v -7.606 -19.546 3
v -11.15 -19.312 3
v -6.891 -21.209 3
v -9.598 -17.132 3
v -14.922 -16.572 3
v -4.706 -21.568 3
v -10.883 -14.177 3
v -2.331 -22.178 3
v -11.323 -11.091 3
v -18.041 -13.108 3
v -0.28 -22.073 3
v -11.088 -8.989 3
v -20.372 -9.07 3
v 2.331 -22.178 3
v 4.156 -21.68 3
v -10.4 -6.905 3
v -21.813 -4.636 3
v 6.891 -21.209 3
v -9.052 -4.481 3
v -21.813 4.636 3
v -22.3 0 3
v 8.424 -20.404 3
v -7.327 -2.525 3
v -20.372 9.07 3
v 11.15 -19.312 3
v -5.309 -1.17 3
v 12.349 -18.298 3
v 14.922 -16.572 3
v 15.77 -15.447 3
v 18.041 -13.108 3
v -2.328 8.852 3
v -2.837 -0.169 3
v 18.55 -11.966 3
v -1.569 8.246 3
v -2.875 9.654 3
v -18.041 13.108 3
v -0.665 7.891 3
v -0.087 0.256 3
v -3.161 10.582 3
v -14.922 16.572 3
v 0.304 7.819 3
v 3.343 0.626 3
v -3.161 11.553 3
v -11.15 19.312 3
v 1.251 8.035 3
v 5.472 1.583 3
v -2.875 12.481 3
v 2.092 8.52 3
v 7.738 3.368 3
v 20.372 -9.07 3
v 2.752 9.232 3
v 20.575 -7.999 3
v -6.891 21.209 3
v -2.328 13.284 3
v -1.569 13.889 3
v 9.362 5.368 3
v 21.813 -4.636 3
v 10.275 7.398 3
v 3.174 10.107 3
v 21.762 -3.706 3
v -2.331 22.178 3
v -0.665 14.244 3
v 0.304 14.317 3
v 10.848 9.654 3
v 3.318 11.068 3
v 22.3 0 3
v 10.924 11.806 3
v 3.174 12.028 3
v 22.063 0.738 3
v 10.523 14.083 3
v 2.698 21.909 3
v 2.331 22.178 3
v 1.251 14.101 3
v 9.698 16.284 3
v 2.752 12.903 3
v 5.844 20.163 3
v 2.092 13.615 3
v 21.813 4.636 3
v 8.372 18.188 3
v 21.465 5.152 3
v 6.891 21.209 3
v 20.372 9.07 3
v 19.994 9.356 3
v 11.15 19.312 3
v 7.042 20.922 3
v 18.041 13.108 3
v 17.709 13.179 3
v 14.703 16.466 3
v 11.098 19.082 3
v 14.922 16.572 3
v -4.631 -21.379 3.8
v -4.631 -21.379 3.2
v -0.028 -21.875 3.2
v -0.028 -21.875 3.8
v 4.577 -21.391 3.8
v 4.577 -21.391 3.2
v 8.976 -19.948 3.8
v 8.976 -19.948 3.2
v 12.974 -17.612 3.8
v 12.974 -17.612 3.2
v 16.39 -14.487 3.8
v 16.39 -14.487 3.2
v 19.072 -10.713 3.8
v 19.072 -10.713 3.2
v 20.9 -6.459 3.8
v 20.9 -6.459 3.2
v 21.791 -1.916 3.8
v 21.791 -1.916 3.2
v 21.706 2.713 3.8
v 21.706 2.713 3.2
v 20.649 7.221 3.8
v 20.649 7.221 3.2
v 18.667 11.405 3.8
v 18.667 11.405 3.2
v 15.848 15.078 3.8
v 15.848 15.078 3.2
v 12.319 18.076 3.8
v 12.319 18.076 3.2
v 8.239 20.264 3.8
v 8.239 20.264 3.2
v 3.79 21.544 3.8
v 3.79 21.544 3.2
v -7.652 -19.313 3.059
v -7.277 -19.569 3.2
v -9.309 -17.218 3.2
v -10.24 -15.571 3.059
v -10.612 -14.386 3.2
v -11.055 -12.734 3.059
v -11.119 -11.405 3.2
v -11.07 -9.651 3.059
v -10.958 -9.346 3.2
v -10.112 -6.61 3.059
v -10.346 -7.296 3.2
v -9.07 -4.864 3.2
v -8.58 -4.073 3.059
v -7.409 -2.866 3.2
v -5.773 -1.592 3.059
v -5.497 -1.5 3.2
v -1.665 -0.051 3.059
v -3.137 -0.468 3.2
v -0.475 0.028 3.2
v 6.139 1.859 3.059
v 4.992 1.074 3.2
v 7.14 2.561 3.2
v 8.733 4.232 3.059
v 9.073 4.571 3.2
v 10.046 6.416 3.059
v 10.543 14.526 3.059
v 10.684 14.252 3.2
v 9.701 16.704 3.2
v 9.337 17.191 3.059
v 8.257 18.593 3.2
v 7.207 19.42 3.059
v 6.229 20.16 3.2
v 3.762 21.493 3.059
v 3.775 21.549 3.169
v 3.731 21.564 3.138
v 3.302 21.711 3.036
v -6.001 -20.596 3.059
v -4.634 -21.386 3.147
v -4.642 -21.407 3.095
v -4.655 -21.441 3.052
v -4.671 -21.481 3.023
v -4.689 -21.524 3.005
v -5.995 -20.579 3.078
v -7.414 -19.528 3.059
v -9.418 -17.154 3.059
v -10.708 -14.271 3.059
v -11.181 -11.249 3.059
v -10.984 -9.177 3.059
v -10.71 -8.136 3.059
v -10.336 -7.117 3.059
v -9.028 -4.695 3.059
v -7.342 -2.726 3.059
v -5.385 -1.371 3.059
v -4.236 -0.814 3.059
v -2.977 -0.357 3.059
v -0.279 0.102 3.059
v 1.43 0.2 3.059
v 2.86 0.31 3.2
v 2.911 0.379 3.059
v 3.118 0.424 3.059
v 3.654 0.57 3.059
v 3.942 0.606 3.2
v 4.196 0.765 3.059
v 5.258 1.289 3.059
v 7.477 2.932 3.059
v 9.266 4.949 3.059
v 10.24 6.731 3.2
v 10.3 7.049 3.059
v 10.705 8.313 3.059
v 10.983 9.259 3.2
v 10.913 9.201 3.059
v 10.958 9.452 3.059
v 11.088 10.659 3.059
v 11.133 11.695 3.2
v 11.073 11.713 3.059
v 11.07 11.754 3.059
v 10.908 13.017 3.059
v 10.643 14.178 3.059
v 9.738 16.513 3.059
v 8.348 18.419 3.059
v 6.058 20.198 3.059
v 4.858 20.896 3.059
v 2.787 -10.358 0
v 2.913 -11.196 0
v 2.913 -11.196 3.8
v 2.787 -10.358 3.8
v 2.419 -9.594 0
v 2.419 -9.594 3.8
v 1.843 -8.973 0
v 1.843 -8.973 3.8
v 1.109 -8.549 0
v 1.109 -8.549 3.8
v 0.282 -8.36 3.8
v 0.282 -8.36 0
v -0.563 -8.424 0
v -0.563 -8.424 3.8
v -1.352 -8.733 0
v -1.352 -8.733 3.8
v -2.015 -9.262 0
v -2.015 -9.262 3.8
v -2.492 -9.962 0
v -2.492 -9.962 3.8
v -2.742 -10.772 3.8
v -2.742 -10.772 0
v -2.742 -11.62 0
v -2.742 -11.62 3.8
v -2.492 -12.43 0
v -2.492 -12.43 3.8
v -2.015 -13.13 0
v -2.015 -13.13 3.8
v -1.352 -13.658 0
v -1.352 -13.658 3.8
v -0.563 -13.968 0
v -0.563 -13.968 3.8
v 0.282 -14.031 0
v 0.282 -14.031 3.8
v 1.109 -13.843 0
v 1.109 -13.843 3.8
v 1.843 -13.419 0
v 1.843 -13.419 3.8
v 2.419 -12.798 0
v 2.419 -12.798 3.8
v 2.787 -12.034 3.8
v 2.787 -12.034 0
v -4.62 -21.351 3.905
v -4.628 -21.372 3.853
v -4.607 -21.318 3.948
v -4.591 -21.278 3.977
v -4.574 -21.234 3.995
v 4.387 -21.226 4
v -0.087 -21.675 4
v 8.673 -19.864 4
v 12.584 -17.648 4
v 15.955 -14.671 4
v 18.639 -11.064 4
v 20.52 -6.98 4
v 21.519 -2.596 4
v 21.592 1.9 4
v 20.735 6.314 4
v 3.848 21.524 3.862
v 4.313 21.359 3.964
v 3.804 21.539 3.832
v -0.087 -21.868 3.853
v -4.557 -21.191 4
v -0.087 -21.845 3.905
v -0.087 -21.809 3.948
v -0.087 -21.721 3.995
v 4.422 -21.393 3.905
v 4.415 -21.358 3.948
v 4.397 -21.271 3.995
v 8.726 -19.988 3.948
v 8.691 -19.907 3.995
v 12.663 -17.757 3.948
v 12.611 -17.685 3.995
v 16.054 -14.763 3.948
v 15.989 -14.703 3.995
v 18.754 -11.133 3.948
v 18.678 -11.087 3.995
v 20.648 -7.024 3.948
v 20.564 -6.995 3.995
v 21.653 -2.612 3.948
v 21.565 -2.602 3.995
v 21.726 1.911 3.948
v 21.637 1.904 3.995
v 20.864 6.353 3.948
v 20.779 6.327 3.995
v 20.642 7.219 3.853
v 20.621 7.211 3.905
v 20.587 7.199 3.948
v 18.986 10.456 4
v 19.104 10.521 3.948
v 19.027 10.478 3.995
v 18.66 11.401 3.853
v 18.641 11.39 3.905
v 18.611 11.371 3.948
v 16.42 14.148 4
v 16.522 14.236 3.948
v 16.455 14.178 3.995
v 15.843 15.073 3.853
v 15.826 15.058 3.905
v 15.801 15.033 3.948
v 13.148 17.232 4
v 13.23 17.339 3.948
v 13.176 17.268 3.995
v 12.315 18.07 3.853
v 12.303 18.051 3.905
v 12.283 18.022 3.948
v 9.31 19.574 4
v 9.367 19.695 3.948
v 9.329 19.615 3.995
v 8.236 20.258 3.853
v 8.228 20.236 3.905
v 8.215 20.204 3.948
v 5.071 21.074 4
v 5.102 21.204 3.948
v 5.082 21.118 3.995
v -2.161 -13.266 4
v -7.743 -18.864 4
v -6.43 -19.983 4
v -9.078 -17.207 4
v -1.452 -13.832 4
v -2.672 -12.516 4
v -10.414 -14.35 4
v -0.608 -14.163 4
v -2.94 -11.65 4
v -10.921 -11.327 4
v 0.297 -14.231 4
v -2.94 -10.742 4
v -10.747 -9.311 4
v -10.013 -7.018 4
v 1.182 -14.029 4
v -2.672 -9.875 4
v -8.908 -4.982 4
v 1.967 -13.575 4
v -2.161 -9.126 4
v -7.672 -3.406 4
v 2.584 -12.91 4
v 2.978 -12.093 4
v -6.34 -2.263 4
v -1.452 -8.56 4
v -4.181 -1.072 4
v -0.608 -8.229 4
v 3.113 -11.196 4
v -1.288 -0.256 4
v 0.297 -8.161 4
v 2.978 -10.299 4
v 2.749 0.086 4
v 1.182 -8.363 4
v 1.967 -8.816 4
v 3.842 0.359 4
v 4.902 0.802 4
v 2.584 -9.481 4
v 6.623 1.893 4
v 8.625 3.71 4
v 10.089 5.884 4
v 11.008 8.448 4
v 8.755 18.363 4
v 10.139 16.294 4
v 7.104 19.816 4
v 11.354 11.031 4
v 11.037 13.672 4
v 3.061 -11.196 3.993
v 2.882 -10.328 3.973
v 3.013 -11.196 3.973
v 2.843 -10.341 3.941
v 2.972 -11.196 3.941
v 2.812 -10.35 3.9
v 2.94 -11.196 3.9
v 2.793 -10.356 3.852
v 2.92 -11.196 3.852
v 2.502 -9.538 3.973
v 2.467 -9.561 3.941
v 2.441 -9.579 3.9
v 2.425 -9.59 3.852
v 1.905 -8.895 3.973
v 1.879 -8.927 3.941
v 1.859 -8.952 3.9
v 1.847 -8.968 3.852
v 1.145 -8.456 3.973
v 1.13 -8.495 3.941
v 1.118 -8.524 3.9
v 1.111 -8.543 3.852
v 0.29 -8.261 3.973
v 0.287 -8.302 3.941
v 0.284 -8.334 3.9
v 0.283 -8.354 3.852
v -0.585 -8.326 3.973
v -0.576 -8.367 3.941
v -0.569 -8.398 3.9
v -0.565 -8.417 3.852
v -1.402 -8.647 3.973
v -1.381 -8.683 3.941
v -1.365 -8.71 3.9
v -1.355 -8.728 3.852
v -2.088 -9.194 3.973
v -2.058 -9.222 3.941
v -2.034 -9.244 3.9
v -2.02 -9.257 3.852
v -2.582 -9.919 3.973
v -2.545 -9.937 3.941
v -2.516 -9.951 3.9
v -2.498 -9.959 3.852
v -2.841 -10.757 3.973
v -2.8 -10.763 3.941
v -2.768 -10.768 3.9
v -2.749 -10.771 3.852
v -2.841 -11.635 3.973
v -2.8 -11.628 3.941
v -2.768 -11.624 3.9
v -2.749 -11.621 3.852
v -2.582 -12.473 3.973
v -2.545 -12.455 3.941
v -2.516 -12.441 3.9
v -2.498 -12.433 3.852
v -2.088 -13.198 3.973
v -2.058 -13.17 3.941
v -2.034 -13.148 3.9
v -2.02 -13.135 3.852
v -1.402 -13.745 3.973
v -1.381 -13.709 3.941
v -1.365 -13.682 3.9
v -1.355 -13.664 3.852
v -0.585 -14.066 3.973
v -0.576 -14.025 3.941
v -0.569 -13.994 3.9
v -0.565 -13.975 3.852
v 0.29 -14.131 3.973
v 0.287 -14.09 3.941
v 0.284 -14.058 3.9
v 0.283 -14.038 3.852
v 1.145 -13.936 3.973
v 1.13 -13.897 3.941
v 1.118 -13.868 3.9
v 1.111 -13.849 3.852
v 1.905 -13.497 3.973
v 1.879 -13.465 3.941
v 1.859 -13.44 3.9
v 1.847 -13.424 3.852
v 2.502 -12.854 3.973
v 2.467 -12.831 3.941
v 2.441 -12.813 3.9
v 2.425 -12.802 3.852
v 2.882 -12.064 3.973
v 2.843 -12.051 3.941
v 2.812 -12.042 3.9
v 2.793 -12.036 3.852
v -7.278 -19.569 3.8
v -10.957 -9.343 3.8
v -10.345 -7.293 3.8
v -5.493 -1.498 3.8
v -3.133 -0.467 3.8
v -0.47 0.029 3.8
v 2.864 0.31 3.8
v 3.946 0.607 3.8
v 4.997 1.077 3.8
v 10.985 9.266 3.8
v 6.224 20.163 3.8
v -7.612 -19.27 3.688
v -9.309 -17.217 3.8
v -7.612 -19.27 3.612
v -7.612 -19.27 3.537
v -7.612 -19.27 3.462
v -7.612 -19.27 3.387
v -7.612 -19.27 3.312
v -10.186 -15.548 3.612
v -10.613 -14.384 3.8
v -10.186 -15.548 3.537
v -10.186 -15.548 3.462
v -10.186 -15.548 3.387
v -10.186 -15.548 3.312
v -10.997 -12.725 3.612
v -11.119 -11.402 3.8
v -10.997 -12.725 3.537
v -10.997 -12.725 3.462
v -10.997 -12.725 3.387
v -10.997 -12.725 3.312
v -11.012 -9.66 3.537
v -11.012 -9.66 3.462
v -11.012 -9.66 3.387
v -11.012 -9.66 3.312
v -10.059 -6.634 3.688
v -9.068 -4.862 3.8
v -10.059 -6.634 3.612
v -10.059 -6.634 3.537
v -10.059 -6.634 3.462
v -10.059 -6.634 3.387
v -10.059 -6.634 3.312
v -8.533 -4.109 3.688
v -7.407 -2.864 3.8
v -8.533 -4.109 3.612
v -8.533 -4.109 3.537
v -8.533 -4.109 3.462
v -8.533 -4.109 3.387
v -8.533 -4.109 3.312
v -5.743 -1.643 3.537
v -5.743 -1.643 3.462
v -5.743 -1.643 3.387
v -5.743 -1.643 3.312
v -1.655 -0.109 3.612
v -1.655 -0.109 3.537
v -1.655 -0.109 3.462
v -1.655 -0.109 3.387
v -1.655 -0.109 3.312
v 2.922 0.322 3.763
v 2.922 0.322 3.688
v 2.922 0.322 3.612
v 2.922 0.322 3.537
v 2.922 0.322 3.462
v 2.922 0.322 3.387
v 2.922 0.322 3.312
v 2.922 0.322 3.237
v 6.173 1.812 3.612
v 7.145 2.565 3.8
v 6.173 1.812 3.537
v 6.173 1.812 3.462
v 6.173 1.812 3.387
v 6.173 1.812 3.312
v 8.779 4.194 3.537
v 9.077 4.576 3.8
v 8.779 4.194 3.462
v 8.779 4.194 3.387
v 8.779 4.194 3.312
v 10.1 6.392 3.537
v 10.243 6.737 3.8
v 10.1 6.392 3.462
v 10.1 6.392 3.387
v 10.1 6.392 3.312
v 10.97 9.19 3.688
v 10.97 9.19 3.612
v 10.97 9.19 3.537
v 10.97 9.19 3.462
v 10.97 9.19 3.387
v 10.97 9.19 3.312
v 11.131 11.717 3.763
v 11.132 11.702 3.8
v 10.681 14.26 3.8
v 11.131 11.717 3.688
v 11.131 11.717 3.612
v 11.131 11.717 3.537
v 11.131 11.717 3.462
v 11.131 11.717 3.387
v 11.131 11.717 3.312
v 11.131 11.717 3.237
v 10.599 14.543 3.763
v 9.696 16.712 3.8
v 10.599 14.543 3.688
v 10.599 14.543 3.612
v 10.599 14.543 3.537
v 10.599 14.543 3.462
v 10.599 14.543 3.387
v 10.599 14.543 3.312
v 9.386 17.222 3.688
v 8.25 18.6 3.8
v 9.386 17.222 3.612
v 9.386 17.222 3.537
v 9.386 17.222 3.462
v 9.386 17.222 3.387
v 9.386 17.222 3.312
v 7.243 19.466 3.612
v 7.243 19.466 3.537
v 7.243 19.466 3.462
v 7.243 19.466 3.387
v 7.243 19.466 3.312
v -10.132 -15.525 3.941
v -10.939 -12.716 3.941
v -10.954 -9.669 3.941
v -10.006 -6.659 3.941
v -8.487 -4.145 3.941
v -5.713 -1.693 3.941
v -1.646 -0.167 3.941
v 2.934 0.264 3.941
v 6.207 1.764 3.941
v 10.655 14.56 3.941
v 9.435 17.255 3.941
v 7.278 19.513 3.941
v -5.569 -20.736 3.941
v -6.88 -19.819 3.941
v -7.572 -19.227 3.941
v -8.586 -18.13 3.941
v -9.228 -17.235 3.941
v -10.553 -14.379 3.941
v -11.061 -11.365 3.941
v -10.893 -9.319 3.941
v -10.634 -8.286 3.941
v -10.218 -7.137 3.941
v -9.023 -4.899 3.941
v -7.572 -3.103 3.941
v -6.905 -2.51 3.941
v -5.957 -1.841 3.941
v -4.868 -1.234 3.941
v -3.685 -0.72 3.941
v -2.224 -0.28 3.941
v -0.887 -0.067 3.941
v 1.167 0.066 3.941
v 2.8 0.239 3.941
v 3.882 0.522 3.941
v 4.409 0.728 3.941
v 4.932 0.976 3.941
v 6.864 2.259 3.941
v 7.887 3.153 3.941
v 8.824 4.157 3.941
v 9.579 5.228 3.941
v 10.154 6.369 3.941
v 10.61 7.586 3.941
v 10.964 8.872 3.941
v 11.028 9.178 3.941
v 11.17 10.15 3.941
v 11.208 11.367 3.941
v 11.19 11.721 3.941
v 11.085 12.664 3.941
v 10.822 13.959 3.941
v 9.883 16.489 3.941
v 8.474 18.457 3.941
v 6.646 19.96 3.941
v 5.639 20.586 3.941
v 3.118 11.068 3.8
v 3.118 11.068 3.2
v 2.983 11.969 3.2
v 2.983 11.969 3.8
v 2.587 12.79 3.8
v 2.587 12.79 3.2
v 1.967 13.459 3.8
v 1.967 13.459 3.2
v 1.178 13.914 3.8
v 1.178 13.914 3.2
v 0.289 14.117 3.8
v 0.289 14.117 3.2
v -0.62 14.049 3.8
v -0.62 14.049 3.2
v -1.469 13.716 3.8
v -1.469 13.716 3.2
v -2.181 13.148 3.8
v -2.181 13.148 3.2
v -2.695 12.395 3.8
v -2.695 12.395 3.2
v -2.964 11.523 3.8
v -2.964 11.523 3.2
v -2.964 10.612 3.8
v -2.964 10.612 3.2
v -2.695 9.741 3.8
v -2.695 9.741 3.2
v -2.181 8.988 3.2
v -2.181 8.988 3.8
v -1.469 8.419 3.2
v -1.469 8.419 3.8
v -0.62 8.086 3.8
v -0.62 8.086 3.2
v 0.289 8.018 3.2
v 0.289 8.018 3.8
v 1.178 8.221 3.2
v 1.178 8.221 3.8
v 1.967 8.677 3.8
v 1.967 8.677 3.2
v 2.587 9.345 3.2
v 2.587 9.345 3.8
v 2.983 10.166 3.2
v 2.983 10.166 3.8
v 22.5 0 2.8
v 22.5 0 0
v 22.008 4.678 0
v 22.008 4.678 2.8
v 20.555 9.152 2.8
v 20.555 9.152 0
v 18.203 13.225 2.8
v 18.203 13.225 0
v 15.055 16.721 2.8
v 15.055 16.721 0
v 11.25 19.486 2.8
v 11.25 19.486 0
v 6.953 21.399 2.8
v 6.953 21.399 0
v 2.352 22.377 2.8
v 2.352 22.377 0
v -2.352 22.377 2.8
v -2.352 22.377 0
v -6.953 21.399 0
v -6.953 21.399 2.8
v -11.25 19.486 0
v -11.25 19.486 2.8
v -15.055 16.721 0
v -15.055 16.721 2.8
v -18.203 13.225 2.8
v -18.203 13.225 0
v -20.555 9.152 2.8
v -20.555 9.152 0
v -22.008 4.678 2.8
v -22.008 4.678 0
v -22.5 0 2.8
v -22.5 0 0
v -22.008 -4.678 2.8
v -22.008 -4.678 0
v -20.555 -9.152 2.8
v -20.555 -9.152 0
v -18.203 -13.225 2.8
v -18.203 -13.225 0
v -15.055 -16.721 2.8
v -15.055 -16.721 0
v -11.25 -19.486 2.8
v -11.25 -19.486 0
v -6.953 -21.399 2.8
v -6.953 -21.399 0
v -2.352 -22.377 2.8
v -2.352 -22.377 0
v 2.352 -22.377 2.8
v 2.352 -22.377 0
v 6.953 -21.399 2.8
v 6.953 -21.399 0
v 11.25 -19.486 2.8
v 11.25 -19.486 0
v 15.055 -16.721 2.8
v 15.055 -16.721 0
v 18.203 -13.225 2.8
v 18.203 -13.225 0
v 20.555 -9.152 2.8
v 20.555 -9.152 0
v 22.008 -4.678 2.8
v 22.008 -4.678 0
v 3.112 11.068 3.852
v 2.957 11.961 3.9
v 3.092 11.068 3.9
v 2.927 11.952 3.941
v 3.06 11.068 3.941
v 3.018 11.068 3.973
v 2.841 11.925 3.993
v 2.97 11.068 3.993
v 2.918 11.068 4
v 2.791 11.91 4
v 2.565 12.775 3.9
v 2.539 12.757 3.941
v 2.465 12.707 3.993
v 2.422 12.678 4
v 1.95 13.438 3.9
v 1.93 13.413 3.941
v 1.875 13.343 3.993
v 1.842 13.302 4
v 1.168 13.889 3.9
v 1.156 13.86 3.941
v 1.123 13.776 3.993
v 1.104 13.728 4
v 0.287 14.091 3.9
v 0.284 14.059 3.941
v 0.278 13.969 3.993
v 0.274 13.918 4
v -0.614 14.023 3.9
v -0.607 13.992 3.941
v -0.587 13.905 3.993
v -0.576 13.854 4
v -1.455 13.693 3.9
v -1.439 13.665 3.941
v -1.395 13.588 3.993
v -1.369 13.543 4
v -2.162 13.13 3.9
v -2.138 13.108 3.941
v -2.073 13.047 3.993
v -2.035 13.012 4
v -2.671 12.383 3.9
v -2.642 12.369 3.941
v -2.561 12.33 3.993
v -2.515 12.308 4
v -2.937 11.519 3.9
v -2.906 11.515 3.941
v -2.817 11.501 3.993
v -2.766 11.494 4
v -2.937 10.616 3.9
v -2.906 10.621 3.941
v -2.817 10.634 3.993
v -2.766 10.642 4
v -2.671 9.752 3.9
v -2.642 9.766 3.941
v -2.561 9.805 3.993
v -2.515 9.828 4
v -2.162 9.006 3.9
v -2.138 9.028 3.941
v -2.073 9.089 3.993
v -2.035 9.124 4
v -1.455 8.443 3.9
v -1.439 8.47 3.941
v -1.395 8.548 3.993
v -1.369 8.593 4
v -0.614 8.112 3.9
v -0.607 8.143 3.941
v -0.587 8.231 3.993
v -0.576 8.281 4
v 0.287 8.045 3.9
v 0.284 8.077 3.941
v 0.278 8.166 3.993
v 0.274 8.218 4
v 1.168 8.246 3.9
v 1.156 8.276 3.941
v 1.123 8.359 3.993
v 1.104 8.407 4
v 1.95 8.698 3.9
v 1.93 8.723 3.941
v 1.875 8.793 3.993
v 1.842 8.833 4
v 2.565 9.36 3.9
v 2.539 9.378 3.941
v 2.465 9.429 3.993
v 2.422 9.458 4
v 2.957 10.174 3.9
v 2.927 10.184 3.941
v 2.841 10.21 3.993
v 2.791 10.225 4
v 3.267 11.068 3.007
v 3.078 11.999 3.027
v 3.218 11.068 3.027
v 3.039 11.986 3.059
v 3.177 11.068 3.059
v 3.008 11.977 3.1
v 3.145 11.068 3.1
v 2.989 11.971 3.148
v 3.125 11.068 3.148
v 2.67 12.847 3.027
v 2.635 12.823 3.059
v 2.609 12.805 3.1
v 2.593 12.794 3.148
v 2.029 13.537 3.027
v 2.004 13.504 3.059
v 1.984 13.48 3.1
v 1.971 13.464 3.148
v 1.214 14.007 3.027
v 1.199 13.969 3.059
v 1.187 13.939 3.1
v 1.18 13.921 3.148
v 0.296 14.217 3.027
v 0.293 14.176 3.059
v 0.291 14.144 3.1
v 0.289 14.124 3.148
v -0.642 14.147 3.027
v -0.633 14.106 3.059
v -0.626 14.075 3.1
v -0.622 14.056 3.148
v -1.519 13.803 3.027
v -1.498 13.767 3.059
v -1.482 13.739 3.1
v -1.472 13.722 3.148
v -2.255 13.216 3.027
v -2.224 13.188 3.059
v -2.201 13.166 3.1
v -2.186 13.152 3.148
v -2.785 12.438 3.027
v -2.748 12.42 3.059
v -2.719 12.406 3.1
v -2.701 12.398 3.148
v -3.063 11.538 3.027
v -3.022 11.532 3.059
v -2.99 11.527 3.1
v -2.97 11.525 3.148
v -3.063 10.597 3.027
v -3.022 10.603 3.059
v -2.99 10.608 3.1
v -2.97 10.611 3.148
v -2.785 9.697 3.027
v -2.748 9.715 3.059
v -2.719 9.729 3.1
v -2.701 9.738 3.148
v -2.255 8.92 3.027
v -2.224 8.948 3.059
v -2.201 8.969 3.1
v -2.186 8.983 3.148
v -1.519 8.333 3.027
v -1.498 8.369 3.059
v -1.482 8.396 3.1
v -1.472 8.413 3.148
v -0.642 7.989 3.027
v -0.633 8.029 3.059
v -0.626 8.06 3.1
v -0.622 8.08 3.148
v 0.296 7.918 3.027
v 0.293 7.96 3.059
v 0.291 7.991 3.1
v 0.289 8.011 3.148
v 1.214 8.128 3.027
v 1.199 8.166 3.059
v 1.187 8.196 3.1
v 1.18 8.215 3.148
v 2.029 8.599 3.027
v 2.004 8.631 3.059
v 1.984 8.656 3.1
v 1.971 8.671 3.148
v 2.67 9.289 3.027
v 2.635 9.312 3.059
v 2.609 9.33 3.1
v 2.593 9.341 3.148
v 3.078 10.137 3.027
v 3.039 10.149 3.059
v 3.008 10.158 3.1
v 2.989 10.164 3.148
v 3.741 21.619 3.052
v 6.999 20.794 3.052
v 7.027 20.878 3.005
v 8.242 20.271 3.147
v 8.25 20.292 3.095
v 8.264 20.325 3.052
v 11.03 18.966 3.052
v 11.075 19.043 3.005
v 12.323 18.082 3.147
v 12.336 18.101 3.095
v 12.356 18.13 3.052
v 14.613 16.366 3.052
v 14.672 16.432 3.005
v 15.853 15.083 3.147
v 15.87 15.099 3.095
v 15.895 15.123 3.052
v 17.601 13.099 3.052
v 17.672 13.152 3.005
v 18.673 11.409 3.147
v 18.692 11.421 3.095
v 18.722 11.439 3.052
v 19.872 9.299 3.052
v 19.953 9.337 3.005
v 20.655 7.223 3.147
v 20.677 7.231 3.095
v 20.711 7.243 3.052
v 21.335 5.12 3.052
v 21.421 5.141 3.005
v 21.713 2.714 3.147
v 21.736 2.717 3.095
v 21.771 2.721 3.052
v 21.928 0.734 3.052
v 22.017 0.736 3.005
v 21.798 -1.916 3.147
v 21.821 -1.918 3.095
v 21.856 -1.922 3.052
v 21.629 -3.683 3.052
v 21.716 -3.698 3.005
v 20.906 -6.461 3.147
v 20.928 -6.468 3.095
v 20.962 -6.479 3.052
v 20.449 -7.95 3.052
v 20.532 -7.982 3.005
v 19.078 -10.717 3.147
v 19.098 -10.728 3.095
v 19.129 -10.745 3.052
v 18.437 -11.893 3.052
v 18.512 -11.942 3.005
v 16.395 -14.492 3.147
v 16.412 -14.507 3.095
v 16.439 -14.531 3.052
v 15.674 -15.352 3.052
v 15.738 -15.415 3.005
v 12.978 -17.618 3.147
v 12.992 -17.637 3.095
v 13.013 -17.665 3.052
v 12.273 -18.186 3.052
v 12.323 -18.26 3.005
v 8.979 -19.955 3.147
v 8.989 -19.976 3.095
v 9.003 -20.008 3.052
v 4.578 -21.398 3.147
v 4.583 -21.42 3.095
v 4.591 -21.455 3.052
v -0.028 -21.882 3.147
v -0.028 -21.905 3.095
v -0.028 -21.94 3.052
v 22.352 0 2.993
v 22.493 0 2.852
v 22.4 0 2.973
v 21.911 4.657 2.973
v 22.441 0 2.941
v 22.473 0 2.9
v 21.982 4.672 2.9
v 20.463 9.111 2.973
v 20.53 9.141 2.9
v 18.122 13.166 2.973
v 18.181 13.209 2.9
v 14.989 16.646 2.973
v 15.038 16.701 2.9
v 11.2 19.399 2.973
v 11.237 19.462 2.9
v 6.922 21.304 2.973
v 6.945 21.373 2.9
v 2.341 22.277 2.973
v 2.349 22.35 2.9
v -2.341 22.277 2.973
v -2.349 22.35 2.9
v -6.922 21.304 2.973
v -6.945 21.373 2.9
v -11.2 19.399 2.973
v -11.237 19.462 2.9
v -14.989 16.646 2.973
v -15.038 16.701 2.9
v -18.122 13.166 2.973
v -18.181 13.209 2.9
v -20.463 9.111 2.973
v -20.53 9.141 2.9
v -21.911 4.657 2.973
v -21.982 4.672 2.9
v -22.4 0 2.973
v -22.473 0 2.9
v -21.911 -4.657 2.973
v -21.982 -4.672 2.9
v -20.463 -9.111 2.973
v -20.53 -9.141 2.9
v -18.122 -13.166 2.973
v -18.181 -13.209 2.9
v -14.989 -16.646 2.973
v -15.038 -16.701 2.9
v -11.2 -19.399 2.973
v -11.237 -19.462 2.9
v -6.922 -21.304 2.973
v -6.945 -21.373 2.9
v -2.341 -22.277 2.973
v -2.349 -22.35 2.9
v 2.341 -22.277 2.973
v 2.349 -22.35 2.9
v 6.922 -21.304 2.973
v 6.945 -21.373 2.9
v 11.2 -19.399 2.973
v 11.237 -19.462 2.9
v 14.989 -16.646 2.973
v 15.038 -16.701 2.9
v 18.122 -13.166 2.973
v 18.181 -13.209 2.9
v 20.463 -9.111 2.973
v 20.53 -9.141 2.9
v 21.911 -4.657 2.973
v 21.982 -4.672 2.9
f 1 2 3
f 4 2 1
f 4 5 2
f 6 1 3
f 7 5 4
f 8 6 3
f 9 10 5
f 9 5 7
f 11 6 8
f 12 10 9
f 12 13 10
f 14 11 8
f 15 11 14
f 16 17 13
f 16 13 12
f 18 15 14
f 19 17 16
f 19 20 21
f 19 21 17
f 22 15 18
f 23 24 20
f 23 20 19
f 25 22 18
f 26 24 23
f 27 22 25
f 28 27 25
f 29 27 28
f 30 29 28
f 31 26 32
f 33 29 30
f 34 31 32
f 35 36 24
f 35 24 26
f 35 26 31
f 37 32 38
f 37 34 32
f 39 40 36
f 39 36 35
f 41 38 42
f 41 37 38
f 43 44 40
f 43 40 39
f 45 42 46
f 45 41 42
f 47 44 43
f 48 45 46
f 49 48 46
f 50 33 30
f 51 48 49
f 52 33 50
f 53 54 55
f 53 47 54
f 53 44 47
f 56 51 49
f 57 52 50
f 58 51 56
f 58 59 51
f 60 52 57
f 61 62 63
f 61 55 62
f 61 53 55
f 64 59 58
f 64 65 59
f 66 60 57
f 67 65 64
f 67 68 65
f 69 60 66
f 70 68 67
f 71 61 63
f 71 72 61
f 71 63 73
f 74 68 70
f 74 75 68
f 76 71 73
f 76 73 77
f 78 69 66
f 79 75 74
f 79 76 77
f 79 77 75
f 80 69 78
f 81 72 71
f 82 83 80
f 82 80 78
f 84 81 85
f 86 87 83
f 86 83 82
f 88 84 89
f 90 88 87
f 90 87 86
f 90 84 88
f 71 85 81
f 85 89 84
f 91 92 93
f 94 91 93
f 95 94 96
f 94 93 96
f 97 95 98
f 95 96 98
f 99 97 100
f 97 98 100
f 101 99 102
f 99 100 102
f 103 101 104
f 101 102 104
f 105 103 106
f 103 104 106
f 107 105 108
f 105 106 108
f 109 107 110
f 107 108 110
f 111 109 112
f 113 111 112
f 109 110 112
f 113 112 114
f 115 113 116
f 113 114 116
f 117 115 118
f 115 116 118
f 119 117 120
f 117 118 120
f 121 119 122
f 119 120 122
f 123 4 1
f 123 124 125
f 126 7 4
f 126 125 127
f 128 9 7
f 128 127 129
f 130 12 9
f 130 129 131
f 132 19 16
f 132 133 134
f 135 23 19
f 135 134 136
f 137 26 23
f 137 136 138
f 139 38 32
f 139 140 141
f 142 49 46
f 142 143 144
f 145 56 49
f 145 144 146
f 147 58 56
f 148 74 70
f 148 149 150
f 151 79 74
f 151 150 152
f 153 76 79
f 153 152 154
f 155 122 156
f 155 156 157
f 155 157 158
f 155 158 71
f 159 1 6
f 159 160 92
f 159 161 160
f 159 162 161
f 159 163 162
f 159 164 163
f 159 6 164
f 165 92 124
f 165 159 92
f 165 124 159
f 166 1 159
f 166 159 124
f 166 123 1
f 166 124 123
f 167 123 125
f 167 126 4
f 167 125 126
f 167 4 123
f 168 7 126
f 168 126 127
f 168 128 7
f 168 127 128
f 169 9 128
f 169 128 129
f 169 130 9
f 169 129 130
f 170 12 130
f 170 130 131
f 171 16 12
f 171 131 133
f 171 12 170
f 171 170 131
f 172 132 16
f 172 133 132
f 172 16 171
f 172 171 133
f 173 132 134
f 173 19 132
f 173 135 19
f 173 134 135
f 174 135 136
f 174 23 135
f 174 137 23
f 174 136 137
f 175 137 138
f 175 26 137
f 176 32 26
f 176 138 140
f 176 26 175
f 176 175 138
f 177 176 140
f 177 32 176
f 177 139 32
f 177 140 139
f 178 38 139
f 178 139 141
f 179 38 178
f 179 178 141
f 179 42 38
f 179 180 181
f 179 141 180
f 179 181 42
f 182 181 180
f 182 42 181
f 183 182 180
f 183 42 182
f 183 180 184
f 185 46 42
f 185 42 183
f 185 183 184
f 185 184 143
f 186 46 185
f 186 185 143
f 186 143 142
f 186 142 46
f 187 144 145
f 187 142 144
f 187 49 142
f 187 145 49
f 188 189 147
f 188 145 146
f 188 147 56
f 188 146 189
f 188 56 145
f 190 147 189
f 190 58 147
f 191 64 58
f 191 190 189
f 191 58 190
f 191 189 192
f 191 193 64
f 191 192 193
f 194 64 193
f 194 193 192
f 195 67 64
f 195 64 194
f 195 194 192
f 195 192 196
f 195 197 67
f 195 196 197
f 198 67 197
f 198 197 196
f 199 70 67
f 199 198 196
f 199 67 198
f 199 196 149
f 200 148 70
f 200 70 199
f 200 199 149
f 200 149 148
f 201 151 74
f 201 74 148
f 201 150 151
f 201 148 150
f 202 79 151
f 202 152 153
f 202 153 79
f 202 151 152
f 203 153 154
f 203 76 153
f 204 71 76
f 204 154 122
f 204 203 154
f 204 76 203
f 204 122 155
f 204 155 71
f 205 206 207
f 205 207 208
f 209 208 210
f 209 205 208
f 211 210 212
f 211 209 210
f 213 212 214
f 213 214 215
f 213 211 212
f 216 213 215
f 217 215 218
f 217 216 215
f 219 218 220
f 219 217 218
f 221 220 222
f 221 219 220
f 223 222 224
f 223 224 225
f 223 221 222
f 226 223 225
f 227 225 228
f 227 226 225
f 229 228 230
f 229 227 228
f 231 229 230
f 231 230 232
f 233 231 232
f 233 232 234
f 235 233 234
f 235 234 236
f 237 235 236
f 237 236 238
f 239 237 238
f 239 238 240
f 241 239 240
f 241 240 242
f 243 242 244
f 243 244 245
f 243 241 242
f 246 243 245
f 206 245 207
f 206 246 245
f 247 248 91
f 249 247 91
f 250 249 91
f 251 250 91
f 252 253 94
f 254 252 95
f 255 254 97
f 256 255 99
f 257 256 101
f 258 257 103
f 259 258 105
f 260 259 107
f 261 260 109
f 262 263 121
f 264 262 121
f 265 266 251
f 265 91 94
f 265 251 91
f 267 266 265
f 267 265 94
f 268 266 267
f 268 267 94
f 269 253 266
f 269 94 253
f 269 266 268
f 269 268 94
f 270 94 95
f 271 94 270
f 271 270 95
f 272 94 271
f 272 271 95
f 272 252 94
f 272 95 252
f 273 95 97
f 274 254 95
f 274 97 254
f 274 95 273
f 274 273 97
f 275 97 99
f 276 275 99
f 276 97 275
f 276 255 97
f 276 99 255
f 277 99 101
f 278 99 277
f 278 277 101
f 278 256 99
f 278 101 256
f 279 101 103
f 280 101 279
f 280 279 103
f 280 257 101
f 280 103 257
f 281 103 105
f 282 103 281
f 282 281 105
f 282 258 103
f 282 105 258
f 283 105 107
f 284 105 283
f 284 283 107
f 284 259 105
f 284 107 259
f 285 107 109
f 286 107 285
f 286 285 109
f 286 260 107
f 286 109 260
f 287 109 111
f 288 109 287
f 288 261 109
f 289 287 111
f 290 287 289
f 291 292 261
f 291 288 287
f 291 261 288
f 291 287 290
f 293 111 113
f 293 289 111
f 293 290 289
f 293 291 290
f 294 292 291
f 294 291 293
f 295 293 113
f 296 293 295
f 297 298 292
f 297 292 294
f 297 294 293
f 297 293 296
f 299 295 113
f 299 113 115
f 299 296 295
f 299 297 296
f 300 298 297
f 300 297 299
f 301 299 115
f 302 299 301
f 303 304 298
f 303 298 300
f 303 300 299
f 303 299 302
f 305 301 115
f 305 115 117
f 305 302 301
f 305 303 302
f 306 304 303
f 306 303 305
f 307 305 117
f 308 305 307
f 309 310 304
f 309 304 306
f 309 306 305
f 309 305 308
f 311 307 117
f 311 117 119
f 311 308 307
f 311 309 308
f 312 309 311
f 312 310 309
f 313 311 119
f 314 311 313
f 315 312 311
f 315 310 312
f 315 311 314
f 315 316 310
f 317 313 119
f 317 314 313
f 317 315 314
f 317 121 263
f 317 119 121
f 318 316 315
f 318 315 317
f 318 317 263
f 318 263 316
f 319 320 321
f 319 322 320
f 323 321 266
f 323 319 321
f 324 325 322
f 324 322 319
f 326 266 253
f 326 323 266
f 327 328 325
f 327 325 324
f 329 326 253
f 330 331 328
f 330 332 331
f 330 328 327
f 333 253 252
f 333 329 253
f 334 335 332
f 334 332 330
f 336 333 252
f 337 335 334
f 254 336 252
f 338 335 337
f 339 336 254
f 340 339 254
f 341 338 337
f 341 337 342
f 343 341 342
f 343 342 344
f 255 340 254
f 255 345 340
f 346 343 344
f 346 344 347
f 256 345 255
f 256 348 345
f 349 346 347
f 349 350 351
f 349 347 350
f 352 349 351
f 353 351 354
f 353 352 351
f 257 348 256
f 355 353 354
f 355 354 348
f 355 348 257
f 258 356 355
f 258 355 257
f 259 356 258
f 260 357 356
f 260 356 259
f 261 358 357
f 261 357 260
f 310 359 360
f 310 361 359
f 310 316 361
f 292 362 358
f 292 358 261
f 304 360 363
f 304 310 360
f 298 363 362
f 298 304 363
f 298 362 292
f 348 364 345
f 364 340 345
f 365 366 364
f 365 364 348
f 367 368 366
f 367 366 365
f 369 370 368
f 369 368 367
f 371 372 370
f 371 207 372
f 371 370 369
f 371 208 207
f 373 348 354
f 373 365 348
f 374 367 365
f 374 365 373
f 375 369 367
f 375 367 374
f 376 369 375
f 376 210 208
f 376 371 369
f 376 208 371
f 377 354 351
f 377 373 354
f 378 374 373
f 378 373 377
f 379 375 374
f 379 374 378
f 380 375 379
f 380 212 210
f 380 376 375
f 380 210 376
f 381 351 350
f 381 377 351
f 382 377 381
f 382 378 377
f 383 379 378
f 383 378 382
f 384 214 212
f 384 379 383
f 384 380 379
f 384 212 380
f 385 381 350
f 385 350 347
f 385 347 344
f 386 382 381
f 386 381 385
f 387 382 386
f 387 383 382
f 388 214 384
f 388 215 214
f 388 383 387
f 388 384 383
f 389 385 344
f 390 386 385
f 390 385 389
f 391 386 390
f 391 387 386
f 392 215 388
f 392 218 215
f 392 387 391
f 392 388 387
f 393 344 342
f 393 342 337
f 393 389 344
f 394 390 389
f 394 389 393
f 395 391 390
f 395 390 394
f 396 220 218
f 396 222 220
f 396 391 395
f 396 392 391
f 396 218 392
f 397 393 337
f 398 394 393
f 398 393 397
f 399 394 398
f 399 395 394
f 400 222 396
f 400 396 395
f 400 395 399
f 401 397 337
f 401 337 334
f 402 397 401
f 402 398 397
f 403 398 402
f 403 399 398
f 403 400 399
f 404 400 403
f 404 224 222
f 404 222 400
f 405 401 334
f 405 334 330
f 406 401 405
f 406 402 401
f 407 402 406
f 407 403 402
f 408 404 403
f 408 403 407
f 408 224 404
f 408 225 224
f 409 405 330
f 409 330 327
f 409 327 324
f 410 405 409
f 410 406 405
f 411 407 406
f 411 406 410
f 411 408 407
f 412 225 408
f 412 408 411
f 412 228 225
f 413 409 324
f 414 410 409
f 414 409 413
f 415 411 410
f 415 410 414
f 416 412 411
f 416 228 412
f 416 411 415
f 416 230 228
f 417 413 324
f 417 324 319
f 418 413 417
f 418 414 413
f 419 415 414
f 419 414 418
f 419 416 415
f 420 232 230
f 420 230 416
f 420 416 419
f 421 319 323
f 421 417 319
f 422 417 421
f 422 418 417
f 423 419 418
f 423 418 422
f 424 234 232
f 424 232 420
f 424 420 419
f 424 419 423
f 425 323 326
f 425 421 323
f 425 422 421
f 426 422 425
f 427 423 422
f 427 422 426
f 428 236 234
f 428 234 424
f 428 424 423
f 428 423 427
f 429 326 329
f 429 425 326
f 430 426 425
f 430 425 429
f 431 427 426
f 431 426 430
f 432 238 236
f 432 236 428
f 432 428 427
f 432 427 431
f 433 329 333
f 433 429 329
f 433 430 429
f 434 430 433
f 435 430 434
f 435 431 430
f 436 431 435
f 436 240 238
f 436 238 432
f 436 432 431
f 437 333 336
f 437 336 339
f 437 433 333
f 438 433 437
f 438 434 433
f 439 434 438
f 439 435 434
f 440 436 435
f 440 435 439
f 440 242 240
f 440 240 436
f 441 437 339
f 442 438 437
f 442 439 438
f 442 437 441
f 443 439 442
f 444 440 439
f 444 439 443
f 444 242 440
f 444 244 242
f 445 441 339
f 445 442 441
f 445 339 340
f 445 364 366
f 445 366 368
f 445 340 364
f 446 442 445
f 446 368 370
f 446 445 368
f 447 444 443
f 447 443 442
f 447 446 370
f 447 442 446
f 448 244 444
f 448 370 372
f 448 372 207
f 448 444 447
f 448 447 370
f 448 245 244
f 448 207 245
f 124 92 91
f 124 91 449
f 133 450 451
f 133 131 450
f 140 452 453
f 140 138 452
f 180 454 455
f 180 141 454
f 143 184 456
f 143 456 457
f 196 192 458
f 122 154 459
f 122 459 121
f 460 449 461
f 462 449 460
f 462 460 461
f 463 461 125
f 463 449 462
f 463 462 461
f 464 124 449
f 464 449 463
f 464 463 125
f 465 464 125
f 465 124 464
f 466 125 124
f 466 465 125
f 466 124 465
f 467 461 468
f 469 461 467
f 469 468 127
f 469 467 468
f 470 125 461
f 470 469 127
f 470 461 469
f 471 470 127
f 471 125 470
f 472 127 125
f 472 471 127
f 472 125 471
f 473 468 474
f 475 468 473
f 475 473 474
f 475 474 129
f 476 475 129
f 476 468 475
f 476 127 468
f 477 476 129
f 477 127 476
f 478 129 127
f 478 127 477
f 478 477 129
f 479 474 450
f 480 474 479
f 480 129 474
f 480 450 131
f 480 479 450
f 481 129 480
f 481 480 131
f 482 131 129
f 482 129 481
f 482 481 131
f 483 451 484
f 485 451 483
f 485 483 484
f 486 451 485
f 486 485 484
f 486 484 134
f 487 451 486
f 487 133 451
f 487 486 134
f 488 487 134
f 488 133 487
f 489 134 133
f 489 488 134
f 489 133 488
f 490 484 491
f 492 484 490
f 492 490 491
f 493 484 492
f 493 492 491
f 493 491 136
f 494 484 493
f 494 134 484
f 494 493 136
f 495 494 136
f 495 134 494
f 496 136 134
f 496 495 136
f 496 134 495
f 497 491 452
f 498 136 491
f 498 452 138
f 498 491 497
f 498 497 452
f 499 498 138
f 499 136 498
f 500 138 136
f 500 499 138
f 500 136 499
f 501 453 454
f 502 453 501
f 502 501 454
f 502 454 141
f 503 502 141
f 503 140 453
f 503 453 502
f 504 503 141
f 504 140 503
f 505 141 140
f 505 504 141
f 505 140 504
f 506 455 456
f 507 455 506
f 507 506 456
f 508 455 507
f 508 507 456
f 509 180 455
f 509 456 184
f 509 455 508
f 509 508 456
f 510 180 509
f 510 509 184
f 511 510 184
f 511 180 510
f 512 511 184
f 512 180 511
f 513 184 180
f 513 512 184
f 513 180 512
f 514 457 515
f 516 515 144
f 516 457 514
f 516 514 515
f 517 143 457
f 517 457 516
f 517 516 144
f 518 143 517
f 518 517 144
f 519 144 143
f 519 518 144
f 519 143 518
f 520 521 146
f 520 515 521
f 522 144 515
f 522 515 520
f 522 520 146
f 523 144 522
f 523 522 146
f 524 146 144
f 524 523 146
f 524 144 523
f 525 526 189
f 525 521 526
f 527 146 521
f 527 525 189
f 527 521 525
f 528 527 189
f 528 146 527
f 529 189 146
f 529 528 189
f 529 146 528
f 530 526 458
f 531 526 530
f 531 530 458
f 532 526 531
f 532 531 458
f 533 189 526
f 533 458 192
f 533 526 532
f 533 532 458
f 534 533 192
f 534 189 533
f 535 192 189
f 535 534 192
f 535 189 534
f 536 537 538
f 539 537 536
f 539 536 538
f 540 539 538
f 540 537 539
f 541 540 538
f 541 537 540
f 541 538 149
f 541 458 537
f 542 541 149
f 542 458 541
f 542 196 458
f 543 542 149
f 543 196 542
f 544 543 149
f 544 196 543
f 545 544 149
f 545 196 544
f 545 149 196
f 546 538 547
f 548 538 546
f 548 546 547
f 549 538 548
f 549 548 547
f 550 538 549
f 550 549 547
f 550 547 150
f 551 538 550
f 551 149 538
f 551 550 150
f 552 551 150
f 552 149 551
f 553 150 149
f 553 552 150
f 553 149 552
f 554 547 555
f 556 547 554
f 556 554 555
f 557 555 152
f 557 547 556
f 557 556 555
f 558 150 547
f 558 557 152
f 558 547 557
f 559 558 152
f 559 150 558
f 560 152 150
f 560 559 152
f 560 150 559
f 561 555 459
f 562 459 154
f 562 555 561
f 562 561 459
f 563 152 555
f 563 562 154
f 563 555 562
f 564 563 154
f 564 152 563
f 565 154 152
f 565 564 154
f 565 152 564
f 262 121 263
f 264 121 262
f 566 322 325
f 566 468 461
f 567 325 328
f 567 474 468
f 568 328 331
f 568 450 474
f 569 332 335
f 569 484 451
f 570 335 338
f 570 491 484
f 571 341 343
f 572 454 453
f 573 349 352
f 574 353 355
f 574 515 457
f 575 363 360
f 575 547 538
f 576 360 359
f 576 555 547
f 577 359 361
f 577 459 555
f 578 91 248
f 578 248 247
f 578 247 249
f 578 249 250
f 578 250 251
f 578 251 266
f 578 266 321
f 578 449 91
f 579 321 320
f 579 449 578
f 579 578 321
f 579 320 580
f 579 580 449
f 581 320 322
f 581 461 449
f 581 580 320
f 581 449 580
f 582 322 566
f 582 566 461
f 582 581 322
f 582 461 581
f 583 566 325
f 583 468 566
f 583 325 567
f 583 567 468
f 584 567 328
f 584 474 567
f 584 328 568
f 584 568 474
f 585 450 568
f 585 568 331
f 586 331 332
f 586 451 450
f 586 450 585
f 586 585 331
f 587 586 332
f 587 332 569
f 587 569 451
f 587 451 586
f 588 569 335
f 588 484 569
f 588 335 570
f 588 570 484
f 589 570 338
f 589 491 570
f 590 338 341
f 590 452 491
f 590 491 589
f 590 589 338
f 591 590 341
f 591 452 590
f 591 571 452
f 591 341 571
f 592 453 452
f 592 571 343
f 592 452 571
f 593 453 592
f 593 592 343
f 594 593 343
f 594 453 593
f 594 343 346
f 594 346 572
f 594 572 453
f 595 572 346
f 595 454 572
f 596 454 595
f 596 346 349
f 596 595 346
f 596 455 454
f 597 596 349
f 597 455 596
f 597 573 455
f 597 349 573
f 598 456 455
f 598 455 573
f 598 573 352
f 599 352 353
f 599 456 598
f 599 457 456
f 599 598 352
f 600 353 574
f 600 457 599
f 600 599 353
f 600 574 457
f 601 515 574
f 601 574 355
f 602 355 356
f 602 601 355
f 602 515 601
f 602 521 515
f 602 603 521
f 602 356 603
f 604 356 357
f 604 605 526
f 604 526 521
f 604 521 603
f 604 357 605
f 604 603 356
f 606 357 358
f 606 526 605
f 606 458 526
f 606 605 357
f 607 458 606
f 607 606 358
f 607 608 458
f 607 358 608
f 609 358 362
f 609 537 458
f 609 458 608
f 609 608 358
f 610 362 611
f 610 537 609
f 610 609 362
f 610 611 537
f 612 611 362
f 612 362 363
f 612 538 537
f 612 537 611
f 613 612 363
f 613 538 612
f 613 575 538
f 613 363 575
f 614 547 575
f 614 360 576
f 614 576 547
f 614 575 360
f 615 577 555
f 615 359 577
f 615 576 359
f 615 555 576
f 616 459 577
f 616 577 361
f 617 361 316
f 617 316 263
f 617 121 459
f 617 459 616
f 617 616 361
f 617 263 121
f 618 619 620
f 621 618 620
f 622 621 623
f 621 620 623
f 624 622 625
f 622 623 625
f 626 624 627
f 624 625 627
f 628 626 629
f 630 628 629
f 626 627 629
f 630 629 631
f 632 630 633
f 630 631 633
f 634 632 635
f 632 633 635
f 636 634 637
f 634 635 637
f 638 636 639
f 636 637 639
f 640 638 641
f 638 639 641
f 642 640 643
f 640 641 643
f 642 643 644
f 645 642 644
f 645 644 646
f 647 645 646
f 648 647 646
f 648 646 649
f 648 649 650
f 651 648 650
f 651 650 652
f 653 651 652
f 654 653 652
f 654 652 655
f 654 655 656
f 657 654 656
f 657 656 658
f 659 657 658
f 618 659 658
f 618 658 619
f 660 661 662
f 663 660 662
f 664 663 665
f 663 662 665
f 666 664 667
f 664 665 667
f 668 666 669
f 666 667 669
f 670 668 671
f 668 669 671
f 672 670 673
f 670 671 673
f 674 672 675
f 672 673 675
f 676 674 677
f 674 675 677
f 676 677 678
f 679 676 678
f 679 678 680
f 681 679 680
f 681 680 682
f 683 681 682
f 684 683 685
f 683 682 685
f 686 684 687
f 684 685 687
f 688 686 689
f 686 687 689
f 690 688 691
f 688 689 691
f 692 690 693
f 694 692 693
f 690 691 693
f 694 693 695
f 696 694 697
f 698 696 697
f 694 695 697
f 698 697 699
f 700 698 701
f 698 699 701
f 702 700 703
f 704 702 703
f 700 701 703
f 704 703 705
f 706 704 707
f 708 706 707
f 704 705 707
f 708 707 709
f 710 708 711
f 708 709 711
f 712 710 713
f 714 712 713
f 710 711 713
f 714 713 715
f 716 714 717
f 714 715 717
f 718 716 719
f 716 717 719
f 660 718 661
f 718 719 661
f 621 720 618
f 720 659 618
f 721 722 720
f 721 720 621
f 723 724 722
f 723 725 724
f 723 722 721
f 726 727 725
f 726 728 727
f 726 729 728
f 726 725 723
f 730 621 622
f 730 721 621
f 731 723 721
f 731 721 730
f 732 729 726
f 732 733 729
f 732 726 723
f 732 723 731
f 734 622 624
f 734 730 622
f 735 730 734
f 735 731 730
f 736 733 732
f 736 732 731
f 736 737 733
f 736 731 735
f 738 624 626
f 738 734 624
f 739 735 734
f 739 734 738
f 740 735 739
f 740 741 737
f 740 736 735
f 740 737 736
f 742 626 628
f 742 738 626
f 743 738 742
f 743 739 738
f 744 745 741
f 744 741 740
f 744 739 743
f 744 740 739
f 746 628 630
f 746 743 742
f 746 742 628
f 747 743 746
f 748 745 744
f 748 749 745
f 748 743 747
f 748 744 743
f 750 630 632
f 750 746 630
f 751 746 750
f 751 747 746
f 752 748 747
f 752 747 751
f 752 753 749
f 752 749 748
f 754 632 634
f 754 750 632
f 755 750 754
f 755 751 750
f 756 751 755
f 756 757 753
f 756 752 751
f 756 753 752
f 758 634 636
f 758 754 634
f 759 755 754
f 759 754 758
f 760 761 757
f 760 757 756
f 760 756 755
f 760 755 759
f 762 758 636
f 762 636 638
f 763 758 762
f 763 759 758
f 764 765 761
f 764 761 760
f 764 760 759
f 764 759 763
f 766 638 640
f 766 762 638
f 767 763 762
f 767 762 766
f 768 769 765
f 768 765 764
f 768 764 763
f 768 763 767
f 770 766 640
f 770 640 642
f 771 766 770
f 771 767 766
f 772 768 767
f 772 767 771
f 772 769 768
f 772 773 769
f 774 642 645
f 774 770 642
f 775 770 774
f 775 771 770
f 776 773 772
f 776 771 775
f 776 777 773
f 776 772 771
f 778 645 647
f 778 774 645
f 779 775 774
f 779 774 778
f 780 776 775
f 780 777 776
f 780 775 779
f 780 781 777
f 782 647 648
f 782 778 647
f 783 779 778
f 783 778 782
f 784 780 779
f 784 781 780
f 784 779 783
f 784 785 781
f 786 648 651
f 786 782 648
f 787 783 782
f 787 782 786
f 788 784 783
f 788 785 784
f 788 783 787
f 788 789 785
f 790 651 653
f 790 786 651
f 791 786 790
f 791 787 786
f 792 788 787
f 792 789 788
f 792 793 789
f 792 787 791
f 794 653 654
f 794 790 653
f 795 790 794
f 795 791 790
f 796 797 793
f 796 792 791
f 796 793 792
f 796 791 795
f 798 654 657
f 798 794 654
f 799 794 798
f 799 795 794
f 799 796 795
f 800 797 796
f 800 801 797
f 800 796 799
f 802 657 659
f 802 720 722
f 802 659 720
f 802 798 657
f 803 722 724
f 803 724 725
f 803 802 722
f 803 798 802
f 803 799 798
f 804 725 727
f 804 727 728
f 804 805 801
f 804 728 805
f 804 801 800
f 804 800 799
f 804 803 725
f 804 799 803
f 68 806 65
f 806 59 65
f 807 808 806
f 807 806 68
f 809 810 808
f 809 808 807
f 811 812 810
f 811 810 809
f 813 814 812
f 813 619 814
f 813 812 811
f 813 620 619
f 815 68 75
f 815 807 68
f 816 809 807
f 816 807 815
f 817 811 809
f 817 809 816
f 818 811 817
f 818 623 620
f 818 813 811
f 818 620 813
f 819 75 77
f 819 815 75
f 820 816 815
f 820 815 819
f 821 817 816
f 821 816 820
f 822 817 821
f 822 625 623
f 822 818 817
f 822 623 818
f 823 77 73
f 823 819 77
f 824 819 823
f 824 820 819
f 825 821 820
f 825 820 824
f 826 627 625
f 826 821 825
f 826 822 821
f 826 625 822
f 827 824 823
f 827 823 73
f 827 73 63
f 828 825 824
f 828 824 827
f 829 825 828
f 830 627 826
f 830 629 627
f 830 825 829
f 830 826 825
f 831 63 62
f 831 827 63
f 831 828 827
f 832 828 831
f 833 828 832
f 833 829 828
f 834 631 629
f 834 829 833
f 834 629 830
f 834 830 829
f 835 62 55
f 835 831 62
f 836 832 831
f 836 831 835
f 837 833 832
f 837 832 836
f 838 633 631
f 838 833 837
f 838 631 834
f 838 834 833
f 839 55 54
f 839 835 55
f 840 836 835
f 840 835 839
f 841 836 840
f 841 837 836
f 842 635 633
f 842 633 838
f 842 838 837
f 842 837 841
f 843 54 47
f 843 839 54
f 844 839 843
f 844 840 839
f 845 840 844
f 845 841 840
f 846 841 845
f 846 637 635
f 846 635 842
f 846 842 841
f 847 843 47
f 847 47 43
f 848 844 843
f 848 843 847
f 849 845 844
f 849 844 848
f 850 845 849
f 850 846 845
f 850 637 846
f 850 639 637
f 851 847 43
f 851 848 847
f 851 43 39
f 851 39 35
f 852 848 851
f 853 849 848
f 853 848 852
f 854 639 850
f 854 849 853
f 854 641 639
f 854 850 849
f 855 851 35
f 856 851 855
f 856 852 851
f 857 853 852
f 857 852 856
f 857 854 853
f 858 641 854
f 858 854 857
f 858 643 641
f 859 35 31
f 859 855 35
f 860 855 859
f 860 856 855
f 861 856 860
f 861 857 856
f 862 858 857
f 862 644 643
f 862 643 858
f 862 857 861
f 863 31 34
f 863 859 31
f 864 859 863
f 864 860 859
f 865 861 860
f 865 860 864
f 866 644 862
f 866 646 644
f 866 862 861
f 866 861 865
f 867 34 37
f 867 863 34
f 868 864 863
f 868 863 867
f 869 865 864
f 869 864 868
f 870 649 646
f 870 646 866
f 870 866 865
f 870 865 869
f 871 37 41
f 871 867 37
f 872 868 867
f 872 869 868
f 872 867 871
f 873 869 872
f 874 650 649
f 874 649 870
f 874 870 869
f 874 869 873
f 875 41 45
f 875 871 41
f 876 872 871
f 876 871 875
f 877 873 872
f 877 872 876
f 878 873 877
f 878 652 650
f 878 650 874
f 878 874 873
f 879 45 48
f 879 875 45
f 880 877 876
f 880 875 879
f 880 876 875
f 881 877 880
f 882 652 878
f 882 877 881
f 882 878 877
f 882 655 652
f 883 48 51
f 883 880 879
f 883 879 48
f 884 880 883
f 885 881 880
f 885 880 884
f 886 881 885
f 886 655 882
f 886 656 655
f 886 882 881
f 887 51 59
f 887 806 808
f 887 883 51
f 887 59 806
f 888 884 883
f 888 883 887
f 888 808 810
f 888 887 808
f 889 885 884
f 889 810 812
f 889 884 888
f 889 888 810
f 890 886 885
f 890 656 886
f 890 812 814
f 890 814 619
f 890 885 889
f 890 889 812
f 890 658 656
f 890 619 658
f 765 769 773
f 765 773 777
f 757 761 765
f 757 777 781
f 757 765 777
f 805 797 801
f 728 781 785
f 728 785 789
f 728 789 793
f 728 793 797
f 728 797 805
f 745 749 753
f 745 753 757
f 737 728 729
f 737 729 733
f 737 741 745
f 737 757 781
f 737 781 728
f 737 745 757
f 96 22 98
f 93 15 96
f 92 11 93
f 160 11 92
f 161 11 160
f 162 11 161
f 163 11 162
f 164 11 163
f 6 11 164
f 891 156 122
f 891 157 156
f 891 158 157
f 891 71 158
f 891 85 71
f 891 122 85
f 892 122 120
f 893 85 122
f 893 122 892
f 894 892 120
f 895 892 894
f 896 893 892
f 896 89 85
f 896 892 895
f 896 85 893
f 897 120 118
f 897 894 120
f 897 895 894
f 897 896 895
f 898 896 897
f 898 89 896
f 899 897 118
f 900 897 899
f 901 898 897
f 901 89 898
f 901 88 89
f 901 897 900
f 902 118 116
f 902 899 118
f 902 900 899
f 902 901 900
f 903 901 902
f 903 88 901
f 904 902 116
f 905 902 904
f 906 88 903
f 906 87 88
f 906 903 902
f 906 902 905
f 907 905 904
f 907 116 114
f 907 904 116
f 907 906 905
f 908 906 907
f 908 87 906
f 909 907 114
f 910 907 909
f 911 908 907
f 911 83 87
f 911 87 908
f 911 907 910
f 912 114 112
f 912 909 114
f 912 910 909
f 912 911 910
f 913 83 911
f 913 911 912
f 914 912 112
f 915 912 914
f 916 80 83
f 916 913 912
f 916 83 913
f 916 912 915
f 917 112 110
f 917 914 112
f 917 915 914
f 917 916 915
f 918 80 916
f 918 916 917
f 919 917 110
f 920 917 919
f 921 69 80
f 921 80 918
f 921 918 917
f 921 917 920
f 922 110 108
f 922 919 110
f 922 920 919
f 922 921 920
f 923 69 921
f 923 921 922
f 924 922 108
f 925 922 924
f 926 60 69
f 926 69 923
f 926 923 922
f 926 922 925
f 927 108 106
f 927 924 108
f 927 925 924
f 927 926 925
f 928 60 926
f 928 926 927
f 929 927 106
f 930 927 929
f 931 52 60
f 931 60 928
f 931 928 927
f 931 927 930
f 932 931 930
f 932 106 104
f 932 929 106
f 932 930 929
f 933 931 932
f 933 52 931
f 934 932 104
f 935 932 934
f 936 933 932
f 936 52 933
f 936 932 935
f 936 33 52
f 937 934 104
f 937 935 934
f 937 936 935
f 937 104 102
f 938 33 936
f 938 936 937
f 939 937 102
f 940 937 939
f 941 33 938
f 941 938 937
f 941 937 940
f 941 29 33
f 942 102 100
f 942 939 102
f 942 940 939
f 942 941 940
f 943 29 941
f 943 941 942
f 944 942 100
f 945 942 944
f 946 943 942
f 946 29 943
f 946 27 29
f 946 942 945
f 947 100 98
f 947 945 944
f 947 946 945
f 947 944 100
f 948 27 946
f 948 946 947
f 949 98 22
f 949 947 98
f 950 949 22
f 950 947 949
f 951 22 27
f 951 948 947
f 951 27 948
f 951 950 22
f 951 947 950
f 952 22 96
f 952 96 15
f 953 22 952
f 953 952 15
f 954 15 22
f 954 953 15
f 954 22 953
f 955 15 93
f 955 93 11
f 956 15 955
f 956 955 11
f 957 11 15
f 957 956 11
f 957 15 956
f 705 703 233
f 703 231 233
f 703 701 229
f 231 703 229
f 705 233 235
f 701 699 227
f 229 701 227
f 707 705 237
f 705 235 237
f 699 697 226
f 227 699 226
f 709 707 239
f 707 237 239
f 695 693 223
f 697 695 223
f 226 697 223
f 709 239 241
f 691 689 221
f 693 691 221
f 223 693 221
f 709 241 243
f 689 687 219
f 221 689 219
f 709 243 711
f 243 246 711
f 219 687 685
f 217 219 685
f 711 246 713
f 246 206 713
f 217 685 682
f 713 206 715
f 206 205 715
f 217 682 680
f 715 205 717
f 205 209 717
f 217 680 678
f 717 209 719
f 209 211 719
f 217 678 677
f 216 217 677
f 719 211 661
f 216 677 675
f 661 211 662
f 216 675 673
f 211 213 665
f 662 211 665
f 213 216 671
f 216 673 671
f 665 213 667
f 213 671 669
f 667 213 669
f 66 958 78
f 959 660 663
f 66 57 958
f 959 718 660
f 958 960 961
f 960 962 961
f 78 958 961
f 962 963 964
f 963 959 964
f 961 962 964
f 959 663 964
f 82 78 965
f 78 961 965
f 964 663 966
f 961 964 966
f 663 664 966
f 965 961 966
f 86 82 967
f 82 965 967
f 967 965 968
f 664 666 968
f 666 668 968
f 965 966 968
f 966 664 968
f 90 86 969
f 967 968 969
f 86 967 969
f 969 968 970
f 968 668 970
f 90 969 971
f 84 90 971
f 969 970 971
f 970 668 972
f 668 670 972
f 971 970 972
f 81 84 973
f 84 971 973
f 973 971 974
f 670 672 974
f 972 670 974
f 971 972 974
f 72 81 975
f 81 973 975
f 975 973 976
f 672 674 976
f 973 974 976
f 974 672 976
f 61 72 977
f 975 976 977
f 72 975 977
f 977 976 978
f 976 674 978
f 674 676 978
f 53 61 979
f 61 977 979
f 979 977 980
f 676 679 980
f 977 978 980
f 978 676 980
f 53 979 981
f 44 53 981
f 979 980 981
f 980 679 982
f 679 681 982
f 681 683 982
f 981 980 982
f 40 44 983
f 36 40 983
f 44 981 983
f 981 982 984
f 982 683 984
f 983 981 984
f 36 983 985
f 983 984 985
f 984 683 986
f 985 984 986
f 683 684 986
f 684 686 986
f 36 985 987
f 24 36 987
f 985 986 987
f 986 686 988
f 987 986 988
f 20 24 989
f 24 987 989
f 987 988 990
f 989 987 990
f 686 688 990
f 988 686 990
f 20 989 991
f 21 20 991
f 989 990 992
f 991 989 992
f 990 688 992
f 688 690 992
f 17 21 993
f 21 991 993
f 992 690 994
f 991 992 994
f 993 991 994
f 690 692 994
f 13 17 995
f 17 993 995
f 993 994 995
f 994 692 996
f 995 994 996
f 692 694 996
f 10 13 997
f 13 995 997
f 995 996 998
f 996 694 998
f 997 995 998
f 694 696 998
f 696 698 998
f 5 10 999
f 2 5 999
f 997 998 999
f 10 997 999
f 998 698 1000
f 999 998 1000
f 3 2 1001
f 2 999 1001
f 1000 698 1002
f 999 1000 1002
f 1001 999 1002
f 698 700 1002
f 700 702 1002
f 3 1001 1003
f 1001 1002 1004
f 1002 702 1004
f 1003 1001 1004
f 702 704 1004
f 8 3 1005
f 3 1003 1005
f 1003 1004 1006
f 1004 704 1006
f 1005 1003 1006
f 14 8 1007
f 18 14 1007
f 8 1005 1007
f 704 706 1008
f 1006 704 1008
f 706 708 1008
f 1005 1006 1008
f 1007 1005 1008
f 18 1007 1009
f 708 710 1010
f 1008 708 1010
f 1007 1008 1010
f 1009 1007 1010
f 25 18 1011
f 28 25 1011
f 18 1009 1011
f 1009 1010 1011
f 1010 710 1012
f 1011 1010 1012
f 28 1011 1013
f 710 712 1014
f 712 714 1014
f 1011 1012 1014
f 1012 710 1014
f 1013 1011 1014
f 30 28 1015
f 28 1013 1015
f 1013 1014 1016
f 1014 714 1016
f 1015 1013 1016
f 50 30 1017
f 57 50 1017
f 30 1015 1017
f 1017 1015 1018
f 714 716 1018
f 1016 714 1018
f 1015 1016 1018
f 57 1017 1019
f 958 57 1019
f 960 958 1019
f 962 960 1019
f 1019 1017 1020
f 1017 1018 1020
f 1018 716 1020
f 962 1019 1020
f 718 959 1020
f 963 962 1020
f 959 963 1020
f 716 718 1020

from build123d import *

# Parameters (mm, degrees)
F0_R     = 22.5
F0_R_2   = 3.0580895054
F1_DEPTH = 3
F0_R_3   = 2.8434327744
F2_DEPTH = 4
F3_R     = 0.2


with BuildPart() as f1:
    # F0 (on Top) → F1 (new body)
    with BuildSketch(Plane.XY):
        Circle(F0_R)
        with BuildLine():
            ThreePointArc((3.78963691, 21.544239998), (16.754311869, 14.0644466225), (21.875, 0))
            ThreePointArc((21.875, 0), (13.7333487735, -17.0267658839), (-4.6311263055, -21.3791555994))
            ThreePointArc((-4.6311263055, -21.3791555994), (-21.4658216359, 4.2111906271), (3.78963691, 21.544239998))
        make_face(mode=Mode.SUBTRACT)
        with BuildLine():
            add(Edge.make_bspline(
                [(-4.6311263055, -21.3791555994), (-5.6624461917, -20.761961642), (-7.8306790688, -19.430650922), (-10.5716814976, -15.6350084894), (-11.7438422587, -9.6053296246), (-8.7850572973, -3.9201387309), (-5.8853881133, -1.5005135568), (-1.7083525765, 0.2497461836), (2.9775147435, -0.0480654662), (6.210384611, 1.6478509075), (8.8981903352, 4.0963043034), (10.1738387215, 6.316952936), (11.0840920319, 9.1908490371), (11.2434544747, 11.7162366696), (10.6950005291, 14.5894775149), (9.5258763683, 17.3421657188), (7.31381535, 19.6443719116), (5.0143215498, 20.8842187397), (3.78963691, 21.544239998)],
                knots=[0, 0, 0, 0, 0.0617182324, 0.1304286287, 0.2091930717, 0.2888297958, 0.3511598277, 0.4186517311, 0.4879114967, 0.5489898704, 0.6096819825, 0.6614108731, 0.7166927274, 0.7680907189, 0.822865763, 0.8782565019, 0.9351579188, 1, 1, 1, 1], degree=3))
            ThreePointArc((3.78963691, 21.544239998), (-21.4658216359, 4.2111906271), (-4.6311263055, -21.3791555994))
        make_face()
        with Locations((0.0603093565, 11.0677070916)):
            Circle(F0_R_2, mode=Mode.SUBTRACT)
    extrude(amount=F1_DEPTH)

    # F0 (on Top) → F2 (join)
    with BuildSketch(Plane.XY):
        with BuildLine():
            ThreePointArc((-4.6311263055, -21.3791555994), (13.7333487735, -17.0267658839), (21.875, 0))
            ThreePointArc((21.875, 0), (16.754311869, 14.0644466225), (3.78963691, 21.544239998))
            add(Edge.make_bspline(
                [(-4.6311263055, -21.3791555994), (-5.6624461917, -20.761961642), (-7.8306790688, -19.430650922), (-10.5716814976, -15.6350084894), (-11.7438422587, -9.6053296246), (-8.7850572973, -3.9201387309), (-5.8853881133, -1.5005135568), (-1.7083525765, 0.2497461836), (2.9775147435, -0.0480654662), (6.210384611, 1.6478509075), (8.8981903352, 4.0963043034), (10.1738387215, 6.316952936), (11.0840920319, 9.1908490371), (11.2434544747, 11.7162366696), (10.6950005291, 14.5894775149), (9.5258763683, 17.3421657188), (7.31381535, 19.6443719116), (5.0143215498, 20.8842187397), (3.78963691, 21.544239998)],
                knots=[0, 0, 0, 0, 0.0617182324, 0.1304286287, 0.2091930717, 0.2888297958, 0.3511598277, 0.4186517311, 0.4879114967, 0.5489898704, 0.6096819825, 0.6614108731, 0.7166927274, 0.7680907189, 0.822865763, 0.8782565019, 0.9351579188, 1, 1, 1, 1], degree=3))
        make_face()
        with Locations((0.0696922399, -11.1959171481)):
            Circle(F0_R_3, mode=Mode.SUBTRACT)
        with Locations((0.0603093565, 11.0677070916)):
            Circle(F0_R_2)
    extrude(amount=F2_DEPTH)

    # F3
    f3_edges = [f1.edges().sort_by_distance(p)[0] for p in [
        (-2.99778, 11.067707, 4),
        (-22.5, 0, 3),
        (21.465822, -4.211191, 3),
        (0.465623, 0.086806, 3),
        (-2.99778, 11.067707, 3),
        (21.465822, -4.211191, 4),
        (0.465623, 0.086806, 4),
        (-2.773741, -11.195917, 4),
    ]]
    fillet(f3_edges, radius=F3_R)


solid = f1.part
